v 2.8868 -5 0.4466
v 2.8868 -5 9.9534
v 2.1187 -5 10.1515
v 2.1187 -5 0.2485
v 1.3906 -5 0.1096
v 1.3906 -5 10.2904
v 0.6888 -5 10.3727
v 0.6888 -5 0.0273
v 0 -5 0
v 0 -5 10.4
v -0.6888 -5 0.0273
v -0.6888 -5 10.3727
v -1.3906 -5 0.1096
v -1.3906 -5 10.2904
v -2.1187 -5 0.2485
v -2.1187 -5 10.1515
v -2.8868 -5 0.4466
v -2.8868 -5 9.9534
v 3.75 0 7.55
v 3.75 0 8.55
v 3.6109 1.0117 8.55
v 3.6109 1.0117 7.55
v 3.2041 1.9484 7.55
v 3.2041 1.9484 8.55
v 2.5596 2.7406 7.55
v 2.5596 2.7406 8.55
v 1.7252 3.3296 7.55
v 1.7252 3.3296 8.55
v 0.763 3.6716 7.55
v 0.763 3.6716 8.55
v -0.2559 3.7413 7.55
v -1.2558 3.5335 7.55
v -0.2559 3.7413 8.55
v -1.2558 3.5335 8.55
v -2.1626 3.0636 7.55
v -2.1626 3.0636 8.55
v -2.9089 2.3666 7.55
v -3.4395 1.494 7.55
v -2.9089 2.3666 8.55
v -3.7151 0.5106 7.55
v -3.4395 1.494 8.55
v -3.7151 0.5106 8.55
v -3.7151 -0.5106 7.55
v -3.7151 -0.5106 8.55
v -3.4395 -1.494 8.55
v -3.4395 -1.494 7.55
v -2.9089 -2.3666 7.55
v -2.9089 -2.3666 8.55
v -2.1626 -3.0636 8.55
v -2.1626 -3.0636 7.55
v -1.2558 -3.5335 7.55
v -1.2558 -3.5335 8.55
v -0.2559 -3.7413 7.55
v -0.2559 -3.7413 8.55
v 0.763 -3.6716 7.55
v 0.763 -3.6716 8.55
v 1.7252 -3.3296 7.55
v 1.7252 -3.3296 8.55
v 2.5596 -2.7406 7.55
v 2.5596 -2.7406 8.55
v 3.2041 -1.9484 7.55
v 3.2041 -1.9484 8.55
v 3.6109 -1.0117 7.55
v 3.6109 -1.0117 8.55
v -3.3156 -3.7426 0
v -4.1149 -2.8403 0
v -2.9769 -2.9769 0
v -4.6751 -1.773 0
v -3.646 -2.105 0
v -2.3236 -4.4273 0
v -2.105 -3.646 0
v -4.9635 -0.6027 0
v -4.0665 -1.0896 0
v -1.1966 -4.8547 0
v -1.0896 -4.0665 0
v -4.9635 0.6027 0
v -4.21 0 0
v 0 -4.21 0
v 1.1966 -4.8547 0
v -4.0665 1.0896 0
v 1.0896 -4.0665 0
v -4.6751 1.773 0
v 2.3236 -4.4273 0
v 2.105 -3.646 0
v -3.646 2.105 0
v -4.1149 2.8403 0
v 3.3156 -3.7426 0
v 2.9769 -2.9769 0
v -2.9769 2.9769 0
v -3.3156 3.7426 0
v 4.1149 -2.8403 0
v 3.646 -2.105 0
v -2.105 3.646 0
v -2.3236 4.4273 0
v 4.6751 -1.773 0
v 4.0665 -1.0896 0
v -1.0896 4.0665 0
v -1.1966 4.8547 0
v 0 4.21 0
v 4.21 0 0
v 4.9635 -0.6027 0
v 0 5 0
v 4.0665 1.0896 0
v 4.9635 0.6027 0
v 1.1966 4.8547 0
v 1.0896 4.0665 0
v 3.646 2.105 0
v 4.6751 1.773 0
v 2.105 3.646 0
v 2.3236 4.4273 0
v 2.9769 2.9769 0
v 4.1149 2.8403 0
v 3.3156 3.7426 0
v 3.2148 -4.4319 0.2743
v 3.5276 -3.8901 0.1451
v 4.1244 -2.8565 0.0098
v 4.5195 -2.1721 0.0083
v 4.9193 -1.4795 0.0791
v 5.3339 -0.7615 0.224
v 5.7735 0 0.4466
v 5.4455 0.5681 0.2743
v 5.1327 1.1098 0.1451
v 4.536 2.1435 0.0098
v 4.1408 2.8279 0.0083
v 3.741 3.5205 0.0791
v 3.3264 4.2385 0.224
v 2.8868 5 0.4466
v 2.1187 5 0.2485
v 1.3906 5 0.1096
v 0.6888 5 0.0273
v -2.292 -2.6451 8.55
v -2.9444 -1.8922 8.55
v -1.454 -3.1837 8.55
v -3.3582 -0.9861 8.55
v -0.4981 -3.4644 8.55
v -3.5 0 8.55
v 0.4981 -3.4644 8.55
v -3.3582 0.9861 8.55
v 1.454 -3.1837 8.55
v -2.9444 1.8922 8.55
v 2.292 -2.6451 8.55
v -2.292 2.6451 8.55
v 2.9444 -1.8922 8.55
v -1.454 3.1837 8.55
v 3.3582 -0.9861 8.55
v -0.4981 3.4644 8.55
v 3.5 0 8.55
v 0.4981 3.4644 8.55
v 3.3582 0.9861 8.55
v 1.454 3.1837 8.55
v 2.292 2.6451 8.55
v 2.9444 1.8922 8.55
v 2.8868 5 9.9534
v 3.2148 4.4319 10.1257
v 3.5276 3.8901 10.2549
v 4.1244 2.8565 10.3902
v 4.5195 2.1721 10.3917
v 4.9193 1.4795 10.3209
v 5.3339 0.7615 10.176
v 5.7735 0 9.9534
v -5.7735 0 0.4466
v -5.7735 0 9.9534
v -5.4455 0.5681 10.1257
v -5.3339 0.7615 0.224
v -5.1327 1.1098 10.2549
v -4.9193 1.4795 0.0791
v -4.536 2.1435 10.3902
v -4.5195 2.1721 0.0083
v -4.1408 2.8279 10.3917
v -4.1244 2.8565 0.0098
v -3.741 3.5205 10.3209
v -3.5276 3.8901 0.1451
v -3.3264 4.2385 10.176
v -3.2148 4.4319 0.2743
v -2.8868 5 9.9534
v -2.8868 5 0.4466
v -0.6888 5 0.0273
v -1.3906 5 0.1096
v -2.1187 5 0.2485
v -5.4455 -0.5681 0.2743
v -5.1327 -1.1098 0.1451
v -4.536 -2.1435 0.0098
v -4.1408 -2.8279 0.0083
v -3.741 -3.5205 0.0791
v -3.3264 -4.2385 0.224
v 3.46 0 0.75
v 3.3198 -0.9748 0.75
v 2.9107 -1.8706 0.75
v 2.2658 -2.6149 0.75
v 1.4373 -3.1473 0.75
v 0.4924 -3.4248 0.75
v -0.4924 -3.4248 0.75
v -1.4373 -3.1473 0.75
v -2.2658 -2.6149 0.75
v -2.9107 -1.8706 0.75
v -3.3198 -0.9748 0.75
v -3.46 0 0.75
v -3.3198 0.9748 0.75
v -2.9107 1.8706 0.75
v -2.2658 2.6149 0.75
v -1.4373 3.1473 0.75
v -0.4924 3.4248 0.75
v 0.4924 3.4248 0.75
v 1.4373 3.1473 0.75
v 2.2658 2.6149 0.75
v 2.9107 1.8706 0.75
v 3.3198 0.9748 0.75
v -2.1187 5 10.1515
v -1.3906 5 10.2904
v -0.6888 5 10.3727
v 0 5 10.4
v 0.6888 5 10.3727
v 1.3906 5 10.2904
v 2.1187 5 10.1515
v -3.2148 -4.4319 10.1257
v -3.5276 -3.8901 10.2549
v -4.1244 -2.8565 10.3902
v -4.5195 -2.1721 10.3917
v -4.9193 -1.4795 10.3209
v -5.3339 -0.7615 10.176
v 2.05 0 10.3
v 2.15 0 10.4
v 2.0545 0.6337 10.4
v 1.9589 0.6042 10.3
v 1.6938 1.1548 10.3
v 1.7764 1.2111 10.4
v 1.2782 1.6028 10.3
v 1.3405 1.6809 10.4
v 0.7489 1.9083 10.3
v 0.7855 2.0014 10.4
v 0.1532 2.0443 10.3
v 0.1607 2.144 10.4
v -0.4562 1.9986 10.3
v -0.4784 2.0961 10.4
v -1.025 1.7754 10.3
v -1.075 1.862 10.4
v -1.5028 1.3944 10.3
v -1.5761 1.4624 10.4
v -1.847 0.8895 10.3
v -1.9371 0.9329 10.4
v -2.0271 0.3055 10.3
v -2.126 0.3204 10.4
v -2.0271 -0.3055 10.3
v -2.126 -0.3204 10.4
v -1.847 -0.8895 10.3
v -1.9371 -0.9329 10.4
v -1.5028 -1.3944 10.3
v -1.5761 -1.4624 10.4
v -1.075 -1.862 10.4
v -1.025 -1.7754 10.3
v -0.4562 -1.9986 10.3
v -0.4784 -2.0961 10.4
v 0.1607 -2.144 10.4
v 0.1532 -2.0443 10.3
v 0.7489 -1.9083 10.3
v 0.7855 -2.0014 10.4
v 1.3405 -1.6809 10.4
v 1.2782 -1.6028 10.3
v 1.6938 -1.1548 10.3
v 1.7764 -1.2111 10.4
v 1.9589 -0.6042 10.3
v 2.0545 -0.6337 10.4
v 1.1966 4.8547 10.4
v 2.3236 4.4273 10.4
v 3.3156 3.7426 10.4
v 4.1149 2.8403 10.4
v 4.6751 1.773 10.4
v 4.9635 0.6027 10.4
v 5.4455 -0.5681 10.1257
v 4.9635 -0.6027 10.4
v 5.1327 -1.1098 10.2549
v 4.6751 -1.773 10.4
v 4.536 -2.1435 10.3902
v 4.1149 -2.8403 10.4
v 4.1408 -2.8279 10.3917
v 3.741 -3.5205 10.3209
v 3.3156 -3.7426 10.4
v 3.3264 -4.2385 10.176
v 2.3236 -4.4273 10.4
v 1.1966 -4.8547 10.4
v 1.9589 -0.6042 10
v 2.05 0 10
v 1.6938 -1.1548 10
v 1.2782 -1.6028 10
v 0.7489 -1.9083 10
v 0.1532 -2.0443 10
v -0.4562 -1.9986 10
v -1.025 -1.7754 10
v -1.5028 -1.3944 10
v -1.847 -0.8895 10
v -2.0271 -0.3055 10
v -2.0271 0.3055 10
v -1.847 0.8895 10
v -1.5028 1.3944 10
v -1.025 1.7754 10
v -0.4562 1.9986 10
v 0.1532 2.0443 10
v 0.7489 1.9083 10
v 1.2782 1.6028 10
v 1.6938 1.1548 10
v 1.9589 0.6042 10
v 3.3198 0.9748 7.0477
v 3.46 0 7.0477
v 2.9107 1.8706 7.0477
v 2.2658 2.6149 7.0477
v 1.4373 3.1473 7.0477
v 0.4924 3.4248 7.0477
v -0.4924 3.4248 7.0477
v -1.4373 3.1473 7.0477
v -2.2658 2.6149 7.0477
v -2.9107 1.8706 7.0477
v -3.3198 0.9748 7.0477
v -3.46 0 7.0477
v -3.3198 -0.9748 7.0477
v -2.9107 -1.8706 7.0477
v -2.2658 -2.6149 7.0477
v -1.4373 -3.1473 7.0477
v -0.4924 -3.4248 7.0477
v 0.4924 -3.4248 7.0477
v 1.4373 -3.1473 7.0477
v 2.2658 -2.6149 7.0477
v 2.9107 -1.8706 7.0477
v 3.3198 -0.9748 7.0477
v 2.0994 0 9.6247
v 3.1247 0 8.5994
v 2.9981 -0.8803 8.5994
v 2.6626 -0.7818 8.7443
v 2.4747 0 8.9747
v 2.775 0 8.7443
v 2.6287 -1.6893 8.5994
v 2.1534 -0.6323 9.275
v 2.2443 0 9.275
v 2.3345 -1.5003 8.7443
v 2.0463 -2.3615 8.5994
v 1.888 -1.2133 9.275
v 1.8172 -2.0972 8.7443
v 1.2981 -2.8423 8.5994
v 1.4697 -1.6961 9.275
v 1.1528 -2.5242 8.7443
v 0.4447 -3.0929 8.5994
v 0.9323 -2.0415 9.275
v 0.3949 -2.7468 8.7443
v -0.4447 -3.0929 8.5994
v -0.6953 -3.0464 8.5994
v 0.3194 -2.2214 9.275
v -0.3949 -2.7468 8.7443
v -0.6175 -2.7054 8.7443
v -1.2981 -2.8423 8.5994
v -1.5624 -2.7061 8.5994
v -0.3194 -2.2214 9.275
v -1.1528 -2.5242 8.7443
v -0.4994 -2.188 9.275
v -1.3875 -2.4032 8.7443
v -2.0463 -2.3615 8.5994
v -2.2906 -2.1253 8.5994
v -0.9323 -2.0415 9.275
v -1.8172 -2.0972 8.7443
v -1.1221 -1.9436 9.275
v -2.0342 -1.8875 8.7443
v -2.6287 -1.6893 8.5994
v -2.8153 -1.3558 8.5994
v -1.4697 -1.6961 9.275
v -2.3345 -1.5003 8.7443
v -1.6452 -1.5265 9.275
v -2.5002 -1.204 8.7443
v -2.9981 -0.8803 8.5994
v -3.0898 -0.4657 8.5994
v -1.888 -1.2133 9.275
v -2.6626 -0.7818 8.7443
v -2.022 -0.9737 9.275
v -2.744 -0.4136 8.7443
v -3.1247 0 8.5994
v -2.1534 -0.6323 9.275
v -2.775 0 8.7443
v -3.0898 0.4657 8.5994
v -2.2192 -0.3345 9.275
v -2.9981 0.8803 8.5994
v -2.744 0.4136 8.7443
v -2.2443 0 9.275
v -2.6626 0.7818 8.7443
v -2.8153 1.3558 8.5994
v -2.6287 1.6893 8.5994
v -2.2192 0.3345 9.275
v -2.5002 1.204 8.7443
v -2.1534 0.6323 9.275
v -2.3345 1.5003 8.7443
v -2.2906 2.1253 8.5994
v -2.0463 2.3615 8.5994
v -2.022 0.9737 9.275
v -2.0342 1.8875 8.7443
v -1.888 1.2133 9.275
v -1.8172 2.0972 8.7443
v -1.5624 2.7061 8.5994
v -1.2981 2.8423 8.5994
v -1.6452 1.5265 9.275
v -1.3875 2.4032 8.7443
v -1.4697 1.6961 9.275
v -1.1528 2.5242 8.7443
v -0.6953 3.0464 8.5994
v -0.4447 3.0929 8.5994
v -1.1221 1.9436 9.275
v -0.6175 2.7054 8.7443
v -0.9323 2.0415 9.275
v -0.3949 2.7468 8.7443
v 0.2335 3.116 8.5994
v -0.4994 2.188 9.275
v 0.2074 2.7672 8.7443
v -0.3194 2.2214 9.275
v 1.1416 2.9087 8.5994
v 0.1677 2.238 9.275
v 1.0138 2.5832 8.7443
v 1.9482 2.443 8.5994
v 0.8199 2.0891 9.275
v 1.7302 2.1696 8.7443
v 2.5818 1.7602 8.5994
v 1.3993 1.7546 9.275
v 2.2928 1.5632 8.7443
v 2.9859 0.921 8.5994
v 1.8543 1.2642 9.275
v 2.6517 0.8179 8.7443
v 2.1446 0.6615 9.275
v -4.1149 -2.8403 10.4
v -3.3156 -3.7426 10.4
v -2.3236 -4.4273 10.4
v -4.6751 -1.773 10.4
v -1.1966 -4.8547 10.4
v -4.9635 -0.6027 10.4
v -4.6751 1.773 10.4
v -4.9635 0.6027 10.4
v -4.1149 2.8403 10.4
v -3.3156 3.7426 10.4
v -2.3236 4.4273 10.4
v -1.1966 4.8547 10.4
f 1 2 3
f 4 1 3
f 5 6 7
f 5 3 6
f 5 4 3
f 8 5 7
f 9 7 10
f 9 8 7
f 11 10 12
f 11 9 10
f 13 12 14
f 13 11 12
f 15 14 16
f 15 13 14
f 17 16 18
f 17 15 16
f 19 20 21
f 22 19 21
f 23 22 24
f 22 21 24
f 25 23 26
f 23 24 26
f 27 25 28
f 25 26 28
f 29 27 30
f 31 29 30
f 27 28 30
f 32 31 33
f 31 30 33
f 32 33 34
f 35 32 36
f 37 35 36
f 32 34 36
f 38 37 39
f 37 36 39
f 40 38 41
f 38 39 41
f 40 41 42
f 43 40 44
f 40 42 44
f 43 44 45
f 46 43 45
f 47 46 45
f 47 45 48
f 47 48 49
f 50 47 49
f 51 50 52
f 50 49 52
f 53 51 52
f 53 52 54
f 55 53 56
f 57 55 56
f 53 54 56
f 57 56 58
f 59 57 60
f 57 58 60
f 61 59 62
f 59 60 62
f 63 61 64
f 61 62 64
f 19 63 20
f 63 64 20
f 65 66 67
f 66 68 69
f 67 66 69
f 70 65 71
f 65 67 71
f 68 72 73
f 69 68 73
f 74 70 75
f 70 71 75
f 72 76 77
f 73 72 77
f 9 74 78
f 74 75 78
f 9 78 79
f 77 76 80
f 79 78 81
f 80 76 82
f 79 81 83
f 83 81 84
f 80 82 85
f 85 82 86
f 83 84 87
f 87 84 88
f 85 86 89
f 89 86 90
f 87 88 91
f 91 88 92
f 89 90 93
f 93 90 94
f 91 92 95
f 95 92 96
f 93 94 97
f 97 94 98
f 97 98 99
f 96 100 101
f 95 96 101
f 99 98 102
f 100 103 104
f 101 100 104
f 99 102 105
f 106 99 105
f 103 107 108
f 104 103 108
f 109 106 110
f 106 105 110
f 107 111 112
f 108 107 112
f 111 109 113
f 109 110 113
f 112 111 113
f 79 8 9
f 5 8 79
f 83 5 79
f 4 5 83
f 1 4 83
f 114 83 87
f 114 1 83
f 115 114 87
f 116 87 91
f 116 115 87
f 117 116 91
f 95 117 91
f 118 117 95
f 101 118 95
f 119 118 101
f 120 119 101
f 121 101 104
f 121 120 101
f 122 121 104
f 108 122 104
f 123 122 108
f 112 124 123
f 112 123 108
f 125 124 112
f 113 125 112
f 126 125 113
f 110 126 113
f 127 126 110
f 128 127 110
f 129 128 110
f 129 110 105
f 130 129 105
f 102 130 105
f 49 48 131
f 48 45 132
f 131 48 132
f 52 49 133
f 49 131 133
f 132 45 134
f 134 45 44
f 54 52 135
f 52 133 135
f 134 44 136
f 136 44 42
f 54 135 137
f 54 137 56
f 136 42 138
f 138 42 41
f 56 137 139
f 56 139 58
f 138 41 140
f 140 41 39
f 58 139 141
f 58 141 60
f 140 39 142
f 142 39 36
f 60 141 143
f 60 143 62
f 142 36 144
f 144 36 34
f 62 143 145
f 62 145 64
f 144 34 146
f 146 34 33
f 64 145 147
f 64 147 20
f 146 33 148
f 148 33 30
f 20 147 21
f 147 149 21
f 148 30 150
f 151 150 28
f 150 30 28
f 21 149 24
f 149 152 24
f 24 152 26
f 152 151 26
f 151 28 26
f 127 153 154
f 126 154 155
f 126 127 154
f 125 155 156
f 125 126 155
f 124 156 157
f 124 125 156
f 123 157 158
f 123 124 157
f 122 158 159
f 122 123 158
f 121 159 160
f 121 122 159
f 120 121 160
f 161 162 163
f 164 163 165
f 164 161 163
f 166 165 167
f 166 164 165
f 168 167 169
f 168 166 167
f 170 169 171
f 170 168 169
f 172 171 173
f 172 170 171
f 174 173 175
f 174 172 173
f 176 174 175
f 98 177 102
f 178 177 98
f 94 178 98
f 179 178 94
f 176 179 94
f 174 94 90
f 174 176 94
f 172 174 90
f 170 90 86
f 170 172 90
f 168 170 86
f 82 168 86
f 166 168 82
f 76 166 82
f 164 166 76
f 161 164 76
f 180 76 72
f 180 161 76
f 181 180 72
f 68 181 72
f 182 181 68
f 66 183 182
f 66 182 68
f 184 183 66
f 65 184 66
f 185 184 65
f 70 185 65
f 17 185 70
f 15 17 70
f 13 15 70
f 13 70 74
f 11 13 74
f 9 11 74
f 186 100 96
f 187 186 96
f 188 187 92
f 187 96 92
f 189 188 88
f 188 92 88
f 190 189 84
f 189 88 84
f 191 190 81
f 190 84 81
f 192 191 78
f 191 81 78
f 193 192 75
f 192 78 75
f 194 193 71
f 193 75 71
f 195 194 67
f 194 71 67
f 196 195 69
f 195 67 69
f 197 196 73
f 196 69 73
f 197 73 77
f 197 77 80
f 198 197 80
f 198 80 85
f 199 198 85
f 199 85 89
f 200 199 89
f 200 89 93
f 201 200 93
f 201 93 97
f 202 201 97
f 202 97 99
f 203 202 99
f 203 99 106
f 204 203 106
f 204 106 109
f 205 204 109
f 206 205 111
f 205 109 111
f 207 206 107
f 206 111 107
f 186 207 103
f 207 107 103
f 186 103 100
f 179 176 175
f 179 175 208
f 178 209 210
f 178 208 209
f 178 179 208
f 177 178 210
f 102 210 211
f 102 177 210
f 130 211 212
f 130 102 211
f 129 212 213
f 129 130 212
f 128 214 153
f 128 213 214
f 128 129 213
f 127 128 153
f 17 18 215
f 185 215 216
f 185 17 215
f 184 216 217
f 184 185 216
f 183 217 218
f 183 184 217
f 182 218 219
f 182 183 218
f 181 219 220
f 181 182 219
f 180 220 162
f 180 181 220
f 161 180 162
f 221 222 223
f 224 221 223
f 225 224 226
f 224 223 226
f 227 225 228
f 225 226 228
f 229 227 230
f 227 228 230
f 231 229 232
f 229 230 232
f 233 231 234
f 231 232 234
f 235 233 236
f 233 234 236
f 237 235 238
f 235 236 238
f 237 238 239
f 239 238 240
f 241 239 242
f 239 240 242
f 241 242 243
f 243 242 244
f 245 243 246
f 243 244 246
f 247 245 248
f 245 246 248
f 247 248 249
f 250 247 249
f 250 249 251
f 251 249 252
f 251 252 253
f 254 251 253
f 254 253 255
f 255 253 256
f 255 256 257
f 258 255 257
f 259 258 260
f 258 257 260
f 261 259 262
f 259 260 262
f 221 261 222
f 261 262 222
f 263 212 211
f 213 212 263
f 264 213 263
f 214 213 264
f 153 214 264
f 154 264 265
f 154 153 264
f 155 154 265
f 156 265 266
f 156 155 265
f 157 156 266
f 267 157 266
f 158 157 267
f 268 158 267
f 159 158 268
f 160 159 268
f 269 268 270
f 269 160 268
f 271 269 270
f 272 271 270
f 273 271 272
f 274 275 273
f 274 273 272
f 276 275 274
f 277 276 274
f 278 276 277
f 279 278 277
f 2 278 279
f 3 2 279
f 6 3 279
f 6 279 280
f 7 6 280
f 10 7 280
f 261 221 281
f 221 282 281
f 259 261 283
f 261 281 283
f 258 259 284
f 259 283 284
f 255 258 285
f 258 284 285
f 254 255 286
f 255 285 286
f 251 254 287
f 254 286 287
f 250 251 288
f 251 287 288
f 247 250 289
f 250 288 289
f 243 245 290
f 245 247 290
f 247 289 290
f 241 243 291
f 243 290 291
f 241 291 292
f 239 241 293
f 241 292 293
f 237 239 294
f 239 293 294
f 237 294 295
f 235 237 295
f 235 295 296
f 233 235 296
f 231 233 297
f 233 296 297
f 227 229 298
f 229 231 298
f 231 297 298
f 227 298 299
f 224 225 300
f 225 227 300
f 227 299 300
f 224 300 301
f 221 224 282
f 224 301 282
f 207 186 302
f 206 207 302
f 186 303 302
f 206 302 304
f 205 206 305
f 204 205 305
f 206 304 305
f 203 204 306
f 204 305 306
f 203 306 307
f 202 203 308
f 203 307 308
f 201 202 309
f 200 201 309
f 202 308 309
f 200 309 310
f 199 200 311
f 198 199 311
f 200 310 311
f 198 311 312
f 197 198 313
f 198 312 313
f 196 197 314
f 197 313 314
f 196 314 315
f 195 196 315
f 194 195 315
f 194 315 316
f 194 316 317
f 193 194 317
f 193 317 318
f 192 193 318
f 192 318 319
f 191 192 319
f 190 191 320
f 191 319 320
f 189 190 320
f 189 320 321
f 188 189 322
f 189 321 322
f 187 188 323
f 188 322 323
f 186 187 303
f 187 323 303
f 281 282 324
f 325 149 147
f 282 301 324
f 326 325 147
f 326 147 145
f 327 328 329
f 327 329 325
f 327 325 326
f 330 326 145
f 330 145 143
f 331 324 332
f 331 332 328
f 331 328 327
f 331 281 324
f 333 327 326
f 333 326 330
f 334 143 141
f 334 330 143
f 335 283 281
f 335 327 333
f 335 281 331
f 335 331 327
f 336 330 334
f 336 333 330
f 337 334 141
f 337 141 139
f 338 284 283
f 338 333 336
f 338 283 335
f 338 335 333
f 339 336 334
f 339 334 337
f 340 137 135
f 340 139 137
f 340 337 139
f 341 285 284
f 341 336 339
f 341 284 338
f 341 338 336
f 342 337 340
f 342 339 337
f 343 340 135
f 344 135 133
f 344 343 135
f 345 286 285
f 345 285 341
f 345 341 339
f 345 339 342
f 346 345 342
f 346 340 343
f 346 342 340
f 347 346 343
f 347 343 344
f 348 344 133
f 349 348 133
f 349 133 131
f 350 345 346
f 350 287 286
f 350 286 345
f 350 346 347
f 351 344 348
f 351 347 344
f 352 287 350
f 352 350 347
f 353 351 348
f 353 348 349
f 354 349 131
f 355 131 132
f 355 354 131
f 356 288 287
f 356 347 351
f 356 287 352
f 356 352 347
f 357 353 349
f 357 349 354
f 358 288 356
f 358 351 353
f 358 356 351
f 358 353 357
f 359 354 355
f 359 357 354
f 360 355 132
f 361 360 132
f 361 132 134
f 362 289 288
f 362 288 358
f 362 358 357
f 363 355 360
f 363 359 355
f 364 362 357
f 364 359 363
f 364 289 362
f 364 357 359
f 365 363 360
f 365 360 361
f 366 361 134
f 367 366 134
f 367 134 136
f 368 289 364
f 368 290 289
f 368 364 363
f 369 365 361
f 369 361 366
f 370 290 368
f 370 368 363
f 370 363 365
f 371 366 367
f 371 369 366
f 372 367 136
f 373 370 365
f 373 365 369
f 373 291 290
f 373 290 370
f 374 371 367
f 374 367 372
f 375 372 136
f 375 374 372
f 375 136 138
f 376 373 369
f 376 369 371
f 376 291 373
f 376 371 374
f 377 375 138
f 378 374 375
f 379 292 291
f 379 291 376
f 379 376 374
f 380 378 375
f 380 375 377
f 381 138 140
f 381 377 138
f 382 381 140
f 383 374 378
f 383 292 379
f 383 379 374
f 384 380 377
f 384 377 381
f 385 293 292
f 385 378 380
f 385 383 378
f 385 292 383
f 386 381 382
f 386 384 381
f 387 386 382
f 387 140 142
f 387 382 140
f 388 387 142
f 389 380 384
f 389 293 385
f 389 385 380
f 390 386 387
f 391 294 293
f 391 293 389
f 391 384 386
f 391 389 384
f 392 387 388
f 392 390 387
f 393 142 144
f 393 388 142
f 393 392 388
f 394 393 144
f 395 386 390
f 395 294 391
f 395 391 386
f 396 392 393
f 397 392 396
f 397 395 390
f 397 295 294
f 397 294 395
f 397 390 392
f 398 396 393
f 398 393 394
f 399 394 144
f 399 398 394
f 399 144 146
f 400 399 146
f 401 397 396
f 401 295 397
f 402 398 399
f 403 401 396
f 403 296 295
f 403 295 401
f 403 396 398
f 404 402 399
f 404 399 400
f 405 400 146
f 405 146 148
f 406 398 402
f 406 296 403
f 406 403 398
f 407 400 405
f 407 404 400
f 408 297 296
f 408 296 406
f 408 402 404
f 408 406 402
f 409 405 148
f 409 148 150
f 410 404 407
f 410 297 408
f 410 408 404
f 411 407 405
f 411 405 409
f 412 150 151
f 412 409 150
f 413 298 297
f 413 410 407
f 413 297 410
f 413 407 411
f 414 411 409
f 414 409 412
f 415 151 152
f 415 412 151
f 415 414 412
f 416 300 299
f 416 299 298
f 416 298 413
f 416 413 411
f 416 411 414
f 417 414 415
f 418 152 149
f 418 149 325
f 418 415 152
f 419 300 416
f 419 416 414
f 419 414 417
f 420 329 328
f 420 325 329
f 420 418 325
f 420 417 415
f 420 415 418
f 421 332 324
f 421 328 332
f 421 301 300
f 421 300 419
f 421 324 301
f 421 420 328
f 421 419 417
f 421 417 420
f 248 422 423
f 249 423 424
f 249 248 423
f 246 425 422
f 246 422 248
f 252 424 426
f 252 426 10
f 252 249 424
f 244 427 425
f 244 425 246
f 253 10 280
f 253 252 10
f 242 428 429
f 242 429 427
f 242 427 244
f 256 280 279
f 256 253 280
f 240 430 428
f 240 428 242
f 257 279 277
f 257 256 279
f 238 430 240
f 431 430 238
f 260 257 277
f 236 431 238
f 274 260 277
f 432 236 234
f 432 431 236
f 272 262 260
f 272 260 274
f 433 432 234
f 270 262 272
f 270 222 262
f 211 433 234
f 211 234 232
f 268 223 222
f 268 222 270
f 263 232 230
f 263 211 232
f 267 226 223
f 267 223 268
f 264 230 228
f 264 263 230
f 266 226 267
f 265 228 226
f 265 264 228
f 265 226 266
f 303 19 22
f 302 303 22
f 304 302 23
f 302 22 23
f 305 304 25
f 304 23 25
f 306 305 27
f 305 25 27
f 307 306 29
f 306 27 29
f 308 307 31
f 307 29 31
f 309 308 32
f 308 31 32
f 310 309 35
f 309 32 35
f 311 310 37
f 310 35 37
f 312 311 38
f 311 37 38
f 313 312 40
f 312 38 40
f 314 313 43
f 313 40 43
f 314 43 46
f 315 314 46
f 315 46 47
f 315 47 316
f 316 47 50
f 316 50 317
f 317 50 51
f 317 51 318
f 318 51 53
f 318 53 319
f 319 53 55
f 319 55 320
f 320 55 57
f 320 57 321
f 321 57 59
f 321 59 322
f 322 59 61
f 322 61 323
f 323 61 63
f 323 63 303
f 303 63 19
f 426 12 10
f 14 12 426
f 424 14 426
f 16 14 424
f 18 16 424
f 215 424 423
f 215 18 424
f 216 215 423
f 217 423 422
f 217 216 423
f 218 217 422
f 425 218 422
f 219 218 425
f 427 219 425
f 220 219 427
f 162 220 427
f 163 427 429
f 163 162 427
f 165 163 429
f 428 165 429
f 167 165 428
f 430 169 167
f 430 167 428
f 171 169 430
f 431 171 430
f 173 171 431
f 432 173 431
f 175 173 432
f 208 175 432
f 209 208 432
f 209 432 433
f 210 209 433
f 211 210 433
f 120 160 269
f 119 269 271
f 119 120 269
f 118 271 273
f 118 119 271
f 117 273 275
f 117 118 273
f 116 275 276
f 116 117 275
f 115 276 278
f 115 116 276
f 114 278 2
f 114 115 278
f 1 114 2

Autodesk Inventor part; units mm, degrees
ref_plane "YZ Plane" through (0, 0, 0) normal (1, 0, 0) x (0, 1, 0)
ref_plane "XZ Plane" through (0, 0, 0) normal (0, 1, 0) x (-1, 0, 0)
ref_plane "XY Plane" through (0, 0, 0) normal (0, 0, 1) x (1, 0, 0)
sketch "Náčrt1" plane through (0, 0, 0) normal (0, 1, 0) x (-1, 0, 0)
  line L0 (1.5, 0) -> (-9, 0) projected
  line L1 (0, -2.08) -> (0, 12.48) projected
  line L2 (-2.05, 10.3) -> (-2.05, 10)
  line L3 (-2.05, 10.3) -> (-2.15, 10.4)
  line L4 (-2.15, 10.4) -> (-5, 10.4)
  line L5 (-5, 10.4) -> (-5, 0)
  line L6 (-5, 0) -> (-3.46, 0)
  arc A0 (-3.5, 8.55) -> (-2.05, 10) centre (-3.5, 10) ccw
  line L7 (-3.46, 0) -> (-3.46, 7.0477)
  line L8 (-3.46, 7.0477) -> (-3.75, 7.55)
  line L9 (-3.75, 7.55) -> (-3.75, 8.55)
  line L10 (-3.5, 8.55) -> (-3.75, 8.55)
  line L11 (-5, 10.4) -> (-7.5, 10.4)
  line L12 (-7.5, 10.4) -> (-7.5, 8.9566)
  line L13 (-7.5, 8.9566) -> (-5, 10.4)
  line L14 (-5, 0) -> (-7.5, 0)
  line L15 (-7.5, 0) -> (-7.5, 1.4434)
  line L16 (-7.5, 1.4434) -> (-5, 0)
  line L17 (-3.46, 7.0477) -> (-3.46, 8.5506)
  point P0 (0, 0)
  dimension "d0" = 4.1
  dimension "d1" = 1.45
  dimension "d3" = 6.92
  dimension "d5" = 10
  dimension "d6" = 7.5
  dimension "d7" = 30
  dimension "d8" = 1
  dimension "d9" = 0.1
  dimension "d10" = 45
  dimension "d11" = 0.4
  dimension "d12" = 10.4
  dimension "d13" = 30
  dimension "d14" = 15
revolve "Rotace1" add sketch "Náčrt1" angle 360 about axis through (0, 0, -10) along (0, 0, 1) contours L0 L5 L4 L3 L2 A0 L10 L9 L8 L7 | L8 L9 L10 A0 L17
thread "Závit1" size "M8x1" class "6H" standard "ANSI Metric M Profile" length 7.55
sketch "Náčrt2" plane through (0, 0, 0) normal (0, 0, 1) x (1, 0, 0)
  circle A0 centre (0, 0) radius 5 projected
  circle A1 centre (0, 0) radius 5 projected
  line L0 (-5.7735, 0) -> (-2.8868, 5)
  line L1 (-2.8868, 5) -> (2.8868, 5)
  line L2 (2.8868, 5) -> (5.7735, 0)
  line L3 (5.7735, 0) -> (2.8868, -5)
  line L4 (2.8868, -5) -> (-2.8868, -5)
  line L5 (-2.8868, -5) -> (-5.7735, 0)
  dimension "d16" = 10
extrude "Vysunutí1" add sketch "Náčrt2" along normal blind 10.4 contours A0 L2 L3 | A0 L1 L2 | L3 L4 A0 | A0 L0 L1 | L4 L5 A0 | A0 L5 L0
revolve "Rotace2" cut sketch "Náčrt1" angle 360 about axis through (0, 0, -10) along (0, 0, 1) contours L0 L15 L16 | L13 L12 L11
revolve "Rotace3" cut sketch "Náčrt1" angle 360 about axis through (0, 0, -10) along (0, 0, 1) contours L8 L9 L10 A0 L17
chamfer "Zkosení1" distance 0.75 angle 45 1 edges at (-3.46, 0, 0)
equation "\"d17\" = d12"
